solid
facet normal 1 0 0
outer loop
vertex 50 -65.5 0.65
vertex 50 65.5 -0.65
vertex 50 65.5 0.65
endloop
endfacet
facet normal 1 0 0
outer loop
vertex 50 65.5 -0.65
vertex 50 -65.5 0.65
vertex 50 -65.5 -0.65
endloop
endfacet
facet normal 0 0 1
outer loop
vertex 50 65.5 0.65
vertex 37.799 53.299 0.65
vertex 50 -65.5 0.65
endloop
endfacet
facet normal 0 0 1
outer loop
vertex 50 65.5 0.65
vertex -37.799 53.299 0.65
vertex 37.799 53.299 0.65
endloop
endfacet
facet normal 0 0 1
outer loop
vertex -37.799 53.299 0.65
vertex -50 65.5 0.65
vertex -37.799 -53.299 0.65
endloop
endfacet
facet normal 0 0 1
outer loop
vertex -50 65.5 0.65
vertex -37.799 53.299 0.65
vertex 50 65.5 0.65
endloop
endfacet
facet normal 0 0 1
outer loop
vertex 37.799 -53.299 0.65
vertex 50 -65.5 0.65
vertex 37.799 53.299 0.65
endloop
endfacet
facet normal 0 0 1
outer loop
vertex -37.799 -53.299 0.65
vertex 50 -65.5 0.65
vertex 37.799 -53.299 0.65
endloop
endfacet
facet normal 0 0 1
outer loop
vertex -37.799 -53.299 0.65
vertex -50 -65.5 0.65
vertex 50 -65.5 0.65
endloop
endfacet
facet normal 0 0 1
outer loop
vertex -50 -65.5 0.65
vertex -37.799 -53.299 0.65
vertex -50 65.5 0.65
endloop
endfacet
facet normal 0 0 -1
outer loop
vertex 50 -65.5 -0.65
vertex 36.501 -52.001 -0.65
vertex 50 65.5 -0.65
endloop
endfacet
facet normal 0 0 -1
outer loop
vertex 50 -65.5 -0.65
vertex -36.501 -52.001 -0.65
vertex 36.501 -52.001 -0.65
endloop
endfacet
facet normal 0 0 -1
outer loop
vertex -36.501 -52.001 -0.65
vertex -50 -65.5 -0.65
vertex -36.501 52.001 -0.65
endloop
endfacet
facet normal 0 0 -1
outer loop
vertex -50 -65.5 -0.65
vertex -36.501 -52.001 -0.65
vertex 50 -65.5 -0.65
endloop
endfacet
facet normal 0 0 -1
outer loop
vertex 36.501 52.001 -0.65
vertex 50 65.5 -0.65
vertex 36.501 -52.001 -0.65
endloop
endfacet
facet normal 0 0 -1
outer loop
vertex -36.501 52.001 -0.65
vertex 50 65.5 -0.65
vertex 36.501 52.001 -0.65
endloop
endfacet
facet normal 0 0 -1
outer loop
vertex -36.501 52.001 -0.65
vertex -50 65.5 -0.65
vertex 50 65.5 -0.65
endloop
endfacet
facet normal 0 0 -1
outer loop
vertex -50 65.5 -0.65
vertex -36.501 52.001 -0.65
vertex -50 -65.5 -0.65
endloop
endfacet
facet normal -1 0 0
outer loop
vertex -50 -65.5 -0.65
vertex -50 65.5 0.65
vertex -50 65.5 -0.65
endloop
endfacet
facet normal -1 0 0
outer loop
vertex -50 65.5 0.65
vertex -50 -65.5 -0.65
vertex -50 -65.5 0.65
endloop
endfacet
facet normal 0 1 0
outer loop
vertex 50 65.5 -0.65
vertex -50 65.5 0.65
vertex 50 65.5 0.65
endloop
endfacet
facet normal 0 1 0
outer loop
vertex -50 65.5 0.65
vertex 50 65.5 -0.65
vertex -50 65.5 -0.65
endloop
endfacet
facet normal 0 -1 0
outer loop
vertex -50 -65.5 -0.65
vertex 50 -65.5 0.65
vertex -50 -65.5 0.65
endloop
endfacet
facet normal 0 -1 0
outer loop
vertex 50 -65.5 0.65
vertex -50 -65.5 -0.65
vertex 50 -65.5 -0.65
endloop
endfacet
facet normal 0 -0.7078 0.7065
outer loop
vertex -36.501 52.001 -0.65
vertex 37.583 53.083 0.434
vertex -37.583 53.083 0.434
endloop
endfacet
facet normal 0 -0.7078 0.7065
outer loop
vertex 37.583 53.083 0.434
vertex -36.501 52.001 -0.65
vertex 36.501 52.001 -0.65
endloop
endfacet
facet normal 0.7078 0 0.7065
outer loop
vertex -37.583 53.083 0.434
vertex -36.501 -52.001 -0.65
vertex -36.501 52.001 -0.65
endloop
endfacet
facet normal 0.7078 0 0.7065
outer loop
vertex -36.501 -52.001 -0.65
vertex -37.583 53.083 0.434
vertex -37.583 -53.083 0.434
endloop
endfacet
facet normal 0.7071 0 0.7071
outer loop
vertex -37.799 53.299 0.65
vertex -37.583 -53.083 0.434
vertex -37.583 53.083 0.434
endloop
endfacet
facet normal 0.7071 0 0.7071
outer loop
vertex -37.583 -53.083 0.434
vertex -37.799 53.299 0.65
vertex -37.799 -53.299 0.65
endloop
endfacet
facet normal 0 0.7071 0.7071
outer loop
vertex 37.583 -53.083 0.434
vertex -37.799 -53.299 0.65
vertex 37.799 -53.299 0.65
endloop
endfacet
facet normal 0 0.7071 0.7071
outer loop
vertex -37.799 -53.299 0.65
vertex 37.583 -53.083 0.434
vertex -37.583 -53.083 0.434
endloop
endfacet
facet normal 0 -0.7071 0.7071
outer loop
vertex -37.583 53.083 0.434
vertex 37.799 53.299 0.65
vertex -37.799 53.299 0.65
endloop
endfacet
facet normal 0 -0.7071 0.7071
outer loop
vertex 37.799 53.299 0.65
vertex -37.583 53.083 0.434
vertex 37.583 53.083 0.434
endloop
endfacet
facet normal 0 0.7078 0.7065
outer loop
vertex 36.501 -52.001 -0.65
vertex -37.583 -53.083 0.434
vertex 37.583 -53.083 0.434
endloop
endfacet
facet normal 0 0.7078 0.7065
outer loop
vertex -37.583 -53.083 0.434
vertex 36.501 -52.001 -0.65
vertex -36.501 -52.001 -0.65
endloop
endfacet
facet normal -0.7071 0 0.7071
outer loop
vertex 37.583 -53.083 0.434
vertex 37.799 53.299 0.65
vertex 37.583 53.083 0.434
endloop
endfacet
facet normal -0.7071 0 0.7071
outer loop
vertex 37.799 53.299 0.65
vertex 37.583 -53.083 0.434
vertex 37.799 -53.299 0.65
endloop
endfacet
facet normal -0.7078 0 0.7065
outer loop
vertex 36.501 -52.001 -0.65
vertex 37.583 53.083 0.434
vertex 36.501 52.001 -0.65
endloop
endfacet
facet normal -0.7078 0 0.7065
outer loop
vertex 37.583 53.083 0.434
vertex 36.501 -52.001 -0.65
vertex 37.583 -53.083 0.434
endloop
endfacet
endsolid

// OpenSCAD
/*
 Picture Mat, version 2.0
 Copyright 2024 Tyler Tork
 Licensed under Creative Commons - Attribution - Non-Commercial - Share Alike
    https://creativecommons.org/licenses/by-nc-sa/4.0/
 
 This script creates a flat rectangular insert of a specified size, with a cutout in the middle. This is intended to be placed over a piece of framed artwork to set it off against the frame.
 
 This script uses the roof() built-in function, which is available in recent OpenSCAD client builds if you enable it on the Edit > Preferences > Features screen.
 
 You have to option of selecting "Custom" shape of the mat opening, and using an SVG file to specify that shape. However, if you are running the script on Makerworld, SVG file importing is not supported.
 
 The cutout has an adjustable edge slant from 30 to 90 degrees from the horizontal.
 */

/* [Mat] */
Mat_width = 100;  // 0.1
Mat_height = 131;  // 0.1
Mat_depth = 1.3; // 0.1
/* [Cutout] */
Cutout_width = 73; // 0.1
Cutout_height = 104; // 0.1
Cutout_shape = "r"; // [r:Rectangular,o:Oval,c:Custom]
Cutout_offset_x = 0; // 0.1
Cutout_offset_y = 0; // 0.1
Cutout_angle = 45; //[30:1:90]
// If you use Custom shaped cutout, path of SVG file that defines the shape. This requires OpenSCAD client.
SVG_filename = "";
// if you selected Rectangular shape
Rectangle_corner_radius = 0; // 0.2
// if the cutout has pointy corners, the corresponding corners at the top of the opening should be...
Corner_shape = "p"; // [p:pointy,r:rounded]

/* [Hidden] */
$fa = 1;
$fs = 0.4;
dMat = [Mat_width, Mat_height, Mat_depth];
offs = Mat_depth*tan(90-Cutout_angle);
dHole = [min(Cutout_width, dMat.x-2*offs-2), min(Cutout_height, dMat.y-2*offs-2)];
leeway = (dMat-dHole-[2*offs+2,2*offs+2])/2;

moveHole = [max(min(leeway.x, Cutout_offset_x), -leeway.x), max(min(leeway.y, Cutout_offset_y), -leeway.y), 0];

rad = min(max(Rectangle_corner_radius, 0), dHole.x/2-.01, dHole.y/2-.01);
type = Cutout_shape == "r" && rad > 0 ? "rr" : Cutout_shape;
bHull = Cutout_angle != 90 && (type == "c" || (type == "r" && Corner_shape != "p"));
ratio = [(2*offs)/dHole.x, (2*offs)/dHole.y];

module hole_shape(bTop = false) {
	cOffs = bTop ? [offs,offs] : [0.0];
	if (bTop) {
		if (Corner_shape == "r") {
			offset(r = offs) hole_shape(false);
		} else {
			offset(delta=offs, chamfer=(Corner_shape == "c")) hole_shape(false);
		}
	} else if (type == "r") {
		square(dHole, center = true);
	} else if (type == "rr") {
		offset(r=rad) square(dHole-2*[rad,rad], center = true);
	} else if (type == "o") {
		scale([1, dHole.y/dHole.x]) circle(d=dHole.x);
	} else if (type == "c") {
		translate(dHole/-2) resize(dHole) import(SVG_filename);
	}
}

module roof_hole() {
	dOuter = [dHole.x+offs*3,dHole.y+offs*3,offs];
	scale([1,1,(.002+dMat.z)/offs])
	difference() {
		translate([-dOuter.x/2,-dOuter.y/2,0])
			cube(dOuter);
		translate([0,0,-.001])
		roof(method=Corner_shape == "p" ? "straight" : "voronoi")
		difference() {
			square(dHole + [offs,offs]*6, center=true);
			hole_shape();
		}
	}
}

module hole() {
	htHole = dMat.z+.002;
	if (bHull) {
		color("pink")
		translate([0,0,-dMat.z/2-.001])
		roof_hole();
	} else {
		color("blue")
		linear_extrude(height=htHole, center=true, scale=[(dHole.x+2*offs)/dHole.x, (dHole.y+2*offs)/dHole.y])
		hole_shape();
	}
}

module main() {
	render()
	difference() {
		cube(dMat, center= true);
		translate(moveHole) hole();
	}
}

main();
//roof_hole();
